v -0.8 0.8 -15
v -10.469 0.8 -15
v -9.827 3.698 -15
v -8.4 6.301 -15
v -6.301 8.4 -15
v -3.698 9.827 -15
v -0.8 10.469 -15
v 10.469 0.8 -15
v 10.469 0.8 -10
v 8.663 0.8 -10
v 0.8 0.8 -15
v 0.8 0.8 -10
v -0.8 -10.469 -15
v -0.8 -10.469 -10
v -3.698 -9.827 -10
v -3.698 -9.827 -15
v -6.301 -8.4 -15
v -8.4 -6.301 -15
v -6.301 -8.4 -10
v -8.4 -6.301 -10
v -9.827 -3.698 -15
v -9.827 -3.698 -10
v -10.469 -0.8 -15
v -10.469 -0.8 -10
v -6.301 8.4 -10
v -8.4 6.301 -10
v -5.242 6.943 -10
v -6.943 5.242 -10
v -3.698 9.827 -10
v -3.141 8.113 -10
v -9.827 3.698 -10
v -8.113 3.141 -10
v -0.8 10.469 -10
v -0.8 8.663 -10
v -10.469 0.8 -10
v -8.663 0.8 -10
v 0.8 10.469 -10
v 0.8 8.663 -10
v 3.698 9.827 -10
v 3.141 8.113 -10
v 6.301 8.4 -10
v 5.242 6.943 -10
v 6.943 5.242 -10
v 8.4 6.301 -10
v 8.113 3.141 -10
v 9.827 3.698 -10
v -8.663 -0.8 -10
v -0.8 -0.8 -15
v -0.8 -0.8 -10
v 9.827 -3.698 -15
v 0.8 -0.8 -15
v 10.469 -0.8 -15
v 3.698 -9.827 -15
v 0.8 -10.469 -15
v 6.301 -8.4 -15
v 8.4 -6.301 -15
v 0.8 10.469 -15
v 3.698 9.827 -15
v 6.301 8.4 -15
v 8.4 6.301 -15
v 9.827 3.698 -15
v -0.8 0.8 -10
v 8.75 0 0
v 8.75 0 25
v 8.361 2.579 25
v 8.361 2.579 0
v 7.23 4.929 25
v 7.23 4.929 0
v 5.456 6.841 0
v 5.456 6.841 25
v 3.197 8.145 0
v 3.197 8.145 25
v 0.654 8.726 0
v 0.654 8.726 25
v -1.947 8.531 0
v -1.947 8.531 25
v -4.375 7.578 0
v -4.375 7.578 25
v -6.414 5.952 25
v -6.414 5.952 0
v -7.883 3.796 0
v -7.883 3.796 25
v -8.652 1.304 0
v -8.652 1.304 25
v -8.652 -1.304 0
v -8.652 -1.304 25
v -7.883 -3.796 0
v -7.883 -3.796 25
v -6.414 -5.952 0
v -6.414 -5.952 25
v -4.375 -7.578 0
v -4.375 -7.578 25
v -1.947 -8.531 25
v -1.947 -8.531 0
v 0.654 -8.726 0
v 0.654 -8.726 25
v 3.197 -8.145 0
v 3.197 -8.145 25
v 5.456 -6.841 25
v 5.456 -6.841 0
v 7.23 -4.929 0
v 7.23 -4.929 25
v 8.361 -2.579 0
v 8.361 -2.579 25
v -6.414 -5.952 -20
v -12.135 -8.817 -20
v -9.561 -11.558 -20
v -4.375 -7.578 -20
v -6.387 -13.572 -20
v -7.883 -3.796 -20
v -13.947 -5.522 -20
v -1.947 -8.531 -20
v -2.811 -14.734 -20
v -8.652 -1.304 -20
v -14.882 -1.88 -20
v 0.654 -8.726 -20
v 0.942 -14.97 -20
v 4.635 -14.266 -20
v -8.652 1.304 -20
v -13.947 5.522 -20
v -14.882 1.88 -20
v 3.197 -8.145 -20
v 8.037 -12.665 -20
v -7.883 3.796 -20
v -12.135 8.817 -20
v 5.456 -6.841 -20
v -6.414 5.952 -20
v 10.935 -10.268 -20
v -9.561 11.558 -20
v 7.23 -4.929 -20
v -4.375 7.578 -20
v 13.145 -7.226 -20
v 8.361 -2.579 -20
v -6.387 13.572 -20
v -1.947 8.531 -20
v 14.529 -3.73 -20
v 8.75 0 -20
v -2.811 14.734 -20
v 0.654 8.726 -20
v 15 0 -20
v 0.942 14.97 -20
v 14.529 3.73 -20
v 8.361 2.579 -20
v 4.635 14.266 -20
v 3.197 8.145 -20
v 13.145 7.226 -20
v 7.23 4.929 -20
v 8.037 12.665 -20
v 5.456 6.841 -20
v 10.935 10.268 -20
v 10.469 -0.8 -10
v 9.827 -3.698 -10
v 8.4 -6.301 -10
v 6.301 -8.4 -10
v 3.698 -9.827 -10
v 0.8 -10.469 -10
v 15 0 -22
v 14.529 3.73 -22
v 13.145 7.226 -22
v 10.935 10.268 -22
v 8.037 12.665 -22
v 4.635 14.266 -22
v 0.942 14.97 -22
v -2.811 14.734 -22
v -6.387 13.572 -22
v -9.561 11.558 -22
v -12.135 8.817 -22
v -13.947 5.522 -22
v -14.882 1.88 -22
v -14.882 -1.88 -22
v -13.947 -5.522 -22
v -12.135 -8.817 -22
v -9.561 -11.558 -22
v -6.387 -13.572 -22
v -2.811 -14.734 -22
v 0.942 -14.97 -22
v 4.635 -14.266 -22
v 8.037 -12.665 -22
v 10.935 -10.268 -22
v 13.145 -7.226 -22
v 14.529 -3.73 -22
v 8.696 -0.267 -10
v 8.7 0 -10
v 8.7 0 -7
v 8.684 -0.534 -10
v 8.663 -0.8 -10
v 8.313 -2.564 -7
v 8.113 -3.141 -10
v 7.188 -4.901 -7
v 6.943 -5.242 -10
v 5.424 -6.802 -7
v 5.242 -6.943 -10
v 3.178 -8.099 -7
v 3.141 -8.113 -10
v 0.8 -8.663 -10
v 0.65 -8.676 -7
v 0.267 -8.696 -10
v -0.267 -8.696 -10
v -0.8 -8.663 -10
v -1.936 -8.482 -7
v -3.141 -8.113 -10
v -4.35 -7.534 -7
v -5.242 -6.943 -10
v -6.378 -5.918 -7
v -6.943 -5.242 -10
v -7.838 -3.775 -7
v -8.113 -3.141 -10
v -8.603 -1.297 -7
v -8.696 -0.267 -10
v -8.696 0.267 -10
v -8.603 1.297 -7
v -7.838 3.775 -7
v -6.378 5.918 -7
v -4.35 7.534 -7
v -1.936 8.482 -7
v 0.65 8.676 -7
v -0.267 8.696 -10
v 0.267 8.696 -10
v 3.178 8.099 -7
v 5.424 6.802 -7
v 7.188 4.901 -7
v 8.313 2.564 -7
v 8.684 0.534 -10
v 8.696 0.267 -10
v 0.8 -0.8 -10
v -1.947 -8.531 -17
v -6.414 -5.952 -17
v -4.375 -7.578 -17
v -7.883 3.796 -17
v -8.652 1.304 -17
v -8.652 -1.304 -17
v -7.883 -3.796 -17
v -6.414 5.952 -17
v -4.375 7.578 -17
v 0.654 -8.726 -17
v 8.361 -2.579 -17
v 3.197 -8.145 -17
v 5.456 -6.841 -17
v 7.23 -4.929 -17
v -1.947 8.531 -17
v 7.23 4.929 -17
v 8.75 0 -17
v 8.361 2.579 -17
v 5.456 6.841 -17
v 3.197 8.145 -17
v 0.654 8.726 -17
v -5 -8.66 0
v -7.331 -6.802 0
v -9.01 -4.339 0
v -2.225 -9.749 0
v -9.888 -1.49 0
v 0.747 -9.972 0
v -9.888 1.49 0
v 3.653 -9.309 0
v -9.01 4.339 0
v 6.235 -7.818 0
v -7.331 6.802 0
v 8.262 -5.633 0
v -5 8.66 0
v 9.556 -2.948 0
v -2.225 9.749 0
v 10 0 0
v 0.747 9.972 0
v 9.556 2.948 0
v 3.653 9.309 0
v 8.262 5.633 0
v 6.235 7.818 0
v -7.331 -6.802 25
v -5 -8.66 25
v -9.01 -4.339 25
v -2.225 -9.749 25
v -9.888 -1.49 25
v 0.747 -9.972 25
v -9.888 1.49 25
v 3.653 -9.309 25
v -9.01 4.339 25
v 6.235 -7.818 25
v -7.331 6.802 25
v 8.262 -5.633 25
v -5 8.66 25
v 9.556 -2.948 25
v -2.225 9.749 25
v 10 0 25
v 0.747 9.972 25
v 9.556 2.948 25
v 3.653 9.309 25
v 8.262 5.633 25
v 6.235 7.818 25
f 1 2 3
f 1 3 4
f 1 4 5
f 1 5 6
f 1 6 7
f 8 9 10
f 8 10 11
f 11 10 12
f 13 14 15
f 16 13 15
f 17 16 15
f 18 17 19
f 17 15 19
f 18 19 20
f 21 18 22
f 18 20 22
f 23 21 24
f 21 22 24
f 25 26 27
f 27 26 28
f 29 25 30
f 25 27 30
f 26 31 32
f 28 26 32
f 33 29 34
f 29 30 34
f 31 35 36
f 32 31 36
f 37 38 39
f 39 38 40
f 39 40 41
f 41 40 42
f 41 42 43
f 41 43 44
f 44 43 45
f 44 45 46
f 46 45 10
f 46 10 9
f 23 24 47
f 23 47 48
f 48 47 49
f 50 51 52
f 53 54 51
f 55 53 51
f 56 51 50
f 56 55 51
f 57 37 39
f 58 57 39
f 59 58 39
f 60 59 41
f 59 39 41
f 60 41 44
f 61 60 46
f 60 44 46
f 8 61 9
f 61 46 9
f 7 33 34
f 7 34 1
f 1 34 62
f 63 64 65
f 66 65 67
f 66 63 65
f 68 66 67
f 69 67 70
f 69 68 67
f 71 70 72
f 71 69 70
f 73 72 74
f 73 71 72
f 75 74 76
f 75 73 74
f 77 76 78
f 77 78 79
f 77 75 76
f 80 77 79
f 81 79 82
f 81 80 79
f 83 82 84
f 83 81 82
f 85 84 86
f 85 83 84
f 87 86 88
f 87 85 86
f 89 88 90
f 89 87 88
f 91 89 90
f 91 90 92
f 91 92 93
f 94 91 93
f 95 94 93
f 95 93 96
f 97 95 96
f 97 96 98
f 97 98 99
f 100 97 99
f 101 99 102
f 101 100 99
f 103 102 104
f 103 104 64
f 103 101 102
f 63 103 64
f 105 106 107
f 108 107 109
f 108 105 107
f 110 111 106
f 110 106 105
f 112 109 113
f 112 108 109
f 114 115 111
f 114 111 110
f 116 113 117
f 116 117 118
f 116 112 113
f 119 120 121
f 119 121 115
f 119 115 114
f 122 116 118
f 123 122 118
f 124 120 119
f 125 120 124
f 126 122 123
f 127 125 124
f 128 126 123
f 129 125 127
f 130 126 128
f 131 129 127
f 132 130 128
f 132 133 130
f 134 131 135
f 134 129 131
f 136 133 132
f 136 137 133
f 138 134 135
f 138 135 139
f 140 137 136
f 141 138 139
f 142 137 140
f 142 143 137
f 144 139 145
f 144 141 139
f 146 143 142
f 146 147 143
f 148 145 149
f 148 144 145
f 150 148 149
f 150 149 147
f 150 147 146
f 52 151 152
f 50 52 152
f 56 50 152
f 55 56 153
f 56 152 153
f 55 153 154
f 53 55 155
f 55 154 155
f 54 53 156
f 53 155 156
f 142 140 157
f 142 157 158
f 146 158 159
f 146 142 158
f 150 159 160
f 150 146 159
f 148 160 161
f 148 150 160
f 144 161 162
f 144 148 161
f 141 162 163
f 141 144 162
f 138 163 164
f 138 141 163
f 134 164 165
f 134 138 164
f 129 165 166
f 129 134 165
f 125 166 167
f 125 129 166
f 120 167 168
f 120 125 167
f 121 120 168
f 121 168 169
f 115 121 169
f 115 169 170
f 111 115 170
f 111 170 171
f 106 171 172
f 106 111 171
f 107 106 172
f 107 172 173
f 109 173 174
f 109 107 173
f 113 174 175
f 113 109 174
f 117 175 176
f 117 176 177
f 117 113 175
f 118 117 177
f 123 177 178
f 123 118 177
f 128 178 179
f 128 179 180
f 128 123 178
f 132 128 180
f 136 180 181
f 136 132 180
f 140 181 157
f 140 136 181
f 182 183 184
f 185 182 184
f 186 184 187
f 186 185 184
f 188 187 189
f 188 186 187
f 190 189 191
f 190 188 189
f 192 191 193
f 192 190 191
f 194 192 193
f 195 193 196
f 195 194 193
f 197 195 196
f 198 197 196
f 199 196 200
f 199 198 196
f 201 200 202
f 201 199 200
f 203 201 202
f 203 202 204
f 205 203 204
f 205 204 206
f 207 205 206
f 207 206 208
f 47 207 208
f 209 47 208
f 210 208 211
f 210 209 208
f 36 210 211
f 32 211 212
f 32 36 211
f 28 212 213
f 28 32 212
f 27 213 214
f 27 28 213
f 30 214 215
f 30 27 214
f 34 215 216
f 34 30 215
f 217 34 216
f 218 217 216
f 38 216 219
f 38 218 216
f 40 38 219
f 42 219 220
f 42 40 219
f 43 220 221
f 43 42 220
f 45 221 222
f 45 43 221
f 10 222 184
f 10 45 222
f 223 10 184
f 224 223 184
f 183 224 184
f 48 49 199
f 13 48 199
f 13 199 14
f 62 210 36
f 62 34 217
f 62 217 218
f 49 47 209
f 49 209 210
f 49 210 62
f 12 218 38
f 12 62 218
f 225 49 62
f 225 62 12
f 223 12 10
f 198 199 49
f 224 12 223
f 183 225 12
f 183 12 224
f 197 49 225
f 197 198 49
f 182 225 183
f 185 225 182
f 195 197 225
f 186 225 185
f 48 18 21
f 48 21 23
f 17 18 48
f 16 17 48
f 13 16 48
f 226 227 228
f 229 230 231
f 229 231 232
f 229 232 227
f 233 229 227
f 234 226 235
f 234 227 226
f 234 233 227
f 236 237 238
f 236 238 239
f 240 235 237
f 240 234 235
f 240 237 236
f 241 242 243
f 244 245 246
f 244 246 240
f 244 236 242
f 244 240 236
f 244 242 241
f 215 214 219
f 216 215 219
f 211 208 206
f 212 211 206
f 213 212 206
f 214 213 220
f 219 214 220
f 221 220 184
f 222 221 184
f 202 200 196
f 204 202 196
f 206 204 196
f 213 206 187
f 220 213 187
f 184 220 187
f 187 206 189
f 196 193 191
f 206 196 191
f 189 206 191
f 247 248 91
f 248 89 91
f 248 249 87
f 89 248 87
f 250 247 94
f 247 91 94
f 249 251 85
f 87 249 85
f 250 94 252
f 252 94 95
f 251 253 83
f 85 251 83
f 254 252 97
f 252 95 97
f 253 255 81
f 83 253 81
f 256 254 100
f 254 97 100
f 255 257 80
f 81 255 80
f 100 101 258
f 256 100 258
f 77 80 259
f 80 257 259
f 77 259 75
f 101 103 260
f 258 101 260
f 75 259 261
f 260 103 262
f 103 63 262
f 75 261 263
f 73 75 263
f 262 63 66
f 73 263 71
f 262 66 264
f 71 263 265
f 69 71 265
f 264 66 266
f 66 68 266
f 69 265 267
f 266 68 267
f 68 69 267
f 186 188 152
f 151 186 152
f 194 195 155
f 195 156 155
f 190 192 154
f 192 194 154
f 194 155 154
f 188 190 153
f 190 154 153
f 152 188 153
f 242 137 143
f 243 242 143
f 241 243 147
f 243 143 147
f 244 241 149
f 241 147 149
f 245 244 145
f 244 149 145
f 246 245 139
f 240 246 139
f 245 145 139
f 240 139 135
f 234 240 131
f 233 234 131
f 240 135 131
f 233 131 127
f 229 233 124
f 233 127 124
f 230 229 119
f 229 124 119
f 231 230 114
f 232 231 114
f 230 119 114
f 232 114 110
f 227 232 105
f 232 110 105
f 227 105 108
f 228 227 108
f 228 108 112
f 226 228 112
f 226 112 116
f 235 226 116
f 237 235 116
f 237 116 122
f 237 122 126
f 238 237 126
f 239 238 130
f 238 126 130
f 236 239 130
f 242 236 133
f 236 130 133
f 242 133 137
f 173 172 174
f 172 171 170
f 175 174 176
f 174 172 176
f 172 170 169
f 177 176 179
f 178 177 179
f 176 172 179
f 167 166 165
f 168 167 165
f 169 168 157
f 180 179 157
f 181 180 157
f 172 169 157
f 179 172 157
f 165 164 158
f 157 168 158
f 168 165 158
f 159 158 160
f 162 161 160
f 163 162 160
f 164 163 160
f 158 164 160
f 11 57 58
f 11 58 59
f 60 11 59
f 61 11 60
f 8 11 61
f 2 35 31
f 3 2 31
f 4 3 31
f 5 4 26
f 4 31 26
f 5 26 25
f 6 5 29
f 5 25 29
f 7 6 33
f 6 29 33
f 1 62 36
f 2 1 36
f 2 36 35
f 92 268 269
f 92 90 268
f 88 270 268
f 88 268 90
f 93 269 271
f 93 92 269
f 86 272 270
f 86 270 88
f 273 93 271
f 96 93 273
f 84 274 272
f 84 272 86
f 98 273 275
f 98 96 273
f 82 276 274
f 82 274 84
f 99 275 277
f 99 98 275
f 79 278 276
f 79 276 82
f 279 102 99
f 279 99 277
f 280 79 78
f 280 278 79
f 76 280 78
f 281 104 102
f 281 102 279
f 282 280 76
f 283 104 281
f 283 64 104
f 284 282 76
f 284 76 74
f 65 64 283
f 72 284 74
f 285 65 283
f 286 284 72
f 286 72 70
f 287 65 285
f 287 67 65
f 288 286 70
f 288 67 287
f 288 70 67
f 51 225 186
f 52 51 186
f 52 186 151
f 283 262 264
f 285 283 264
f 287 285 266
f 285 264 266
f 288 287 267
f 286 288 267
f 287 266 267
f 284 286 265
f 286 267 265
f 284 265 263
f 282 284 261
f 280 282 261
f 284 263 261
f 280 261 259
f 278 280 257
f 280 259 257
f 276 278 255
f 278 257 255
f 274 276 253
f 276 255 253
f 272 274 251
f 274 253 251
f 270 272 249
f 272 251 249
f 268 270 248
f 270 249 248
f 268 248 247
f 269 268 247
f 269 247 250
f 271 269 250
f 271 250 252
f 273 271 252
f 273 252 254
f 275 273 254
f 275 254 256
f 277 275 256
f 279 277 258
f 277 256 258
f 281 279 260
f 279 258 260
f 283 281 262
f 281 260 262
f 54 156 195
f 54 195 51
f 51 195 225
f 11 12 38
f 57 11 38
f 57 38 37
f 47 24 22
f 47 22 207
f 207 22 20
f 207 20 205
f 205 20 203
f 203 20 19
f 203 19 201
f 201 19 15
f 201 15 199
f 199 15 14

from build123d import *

# Parameters (mm, degrees)
F0_R      = 10
F0_R_2    = 8.75
F1_DEPTH  = 25
F3_R      = 8.7
F4_DEPTH  = 3
F6_DEPTH  = 5
F8_R      = 8.75
F9_DEPTH  = 3
F8_R_2    = 15
F10_DEPTH = 2


with BuildPart() as f1:
    # F0 (on Top) → F1 (new body)
    with BuildSketch(Plane.XY):
        Circle(F0_R)
        Circle(F0_R_2, mode=Mode.SUBTRACT)
    extrude(amount=F1_DEPTH)


with BuildPart() as f4:
    # F3 (on offset) → F4 (new body)
    with BuildSketch(Plane(origin=(0, 0, -10), x_dir=(1, 0, 0), z_dir=(0, 0, -1))):
        Circle(F3_R)
    extrude(amount=-F4_DEPTH)

    # F5 (on offset) → F6 (join)
    with BuildSketch(Plane(origin=(0, 0, -10), x_dir=(1, 0, 0), z_dir=(0, 0, -1))):
        with BuildLine():
            Line((-0.8, 0.8), (-0.8, 10.4694794522))
            ThreePointArc((-0.8, 10.4694794522), (-7.4246212025, 7.4246212025), (-10.4694794522, 0.8))
            Line((-10.4694794522, 0.8), (-0.8, 0.8))
        make_face()
        with BuildLine():
            Line((0.8, 0.8), (10.4694794522, 0.8))
            ThreePointArc((10.4694794522, 0.8), (7.4246212025, 7.4246212025), (0.8, 10.4694794522))
            Line((0.8, 10.4694794522), (0.8, 0.8))
        make_face()
        with BuildLine():
            ThreePointArc((-10.4694794522, -0.8), (-7.4246212025, -7.4246212025), (-0.8, -10.4694794522))
            Line((-0.8, -10.4694794522), (-0.8, -0.8))
            Line((-0.8, -0.8), (-10.4694794522, -0.8))
        make_face()
        with BuildLine():
            ThreePointArc((0.8, -10.4694794522), (7.4246212025, -7.4246212025), (10.4694794522, -0.8))
            Line((10.4694794522, -0.8), (0.8, -0.8))
            Line((0.8, -0.8), (0.8, -10.4694794522))
        make_face()
    extrude(amount=F6_DEPTH)


with BuildPart() as f9:
    # F8 (on offset) → F9 (new body)
    with BuildSketch(Plane.XY.offset(-20)):
        Circle(F8_R)
    extrude(amount=F9_DEPTH)

    # F8 (on offset) → F10 (join)
    with BuildSketch(Plane.XY.offset(-20)):
        Circle(F8_R_2)
        Circle(F8_R, mode=Mode.SUBTRACT)
        Circle(F8_R)
    extrude(amount=-F10_DEPTH)


solid = Compound([f1.part, f4.part, f9.part])
